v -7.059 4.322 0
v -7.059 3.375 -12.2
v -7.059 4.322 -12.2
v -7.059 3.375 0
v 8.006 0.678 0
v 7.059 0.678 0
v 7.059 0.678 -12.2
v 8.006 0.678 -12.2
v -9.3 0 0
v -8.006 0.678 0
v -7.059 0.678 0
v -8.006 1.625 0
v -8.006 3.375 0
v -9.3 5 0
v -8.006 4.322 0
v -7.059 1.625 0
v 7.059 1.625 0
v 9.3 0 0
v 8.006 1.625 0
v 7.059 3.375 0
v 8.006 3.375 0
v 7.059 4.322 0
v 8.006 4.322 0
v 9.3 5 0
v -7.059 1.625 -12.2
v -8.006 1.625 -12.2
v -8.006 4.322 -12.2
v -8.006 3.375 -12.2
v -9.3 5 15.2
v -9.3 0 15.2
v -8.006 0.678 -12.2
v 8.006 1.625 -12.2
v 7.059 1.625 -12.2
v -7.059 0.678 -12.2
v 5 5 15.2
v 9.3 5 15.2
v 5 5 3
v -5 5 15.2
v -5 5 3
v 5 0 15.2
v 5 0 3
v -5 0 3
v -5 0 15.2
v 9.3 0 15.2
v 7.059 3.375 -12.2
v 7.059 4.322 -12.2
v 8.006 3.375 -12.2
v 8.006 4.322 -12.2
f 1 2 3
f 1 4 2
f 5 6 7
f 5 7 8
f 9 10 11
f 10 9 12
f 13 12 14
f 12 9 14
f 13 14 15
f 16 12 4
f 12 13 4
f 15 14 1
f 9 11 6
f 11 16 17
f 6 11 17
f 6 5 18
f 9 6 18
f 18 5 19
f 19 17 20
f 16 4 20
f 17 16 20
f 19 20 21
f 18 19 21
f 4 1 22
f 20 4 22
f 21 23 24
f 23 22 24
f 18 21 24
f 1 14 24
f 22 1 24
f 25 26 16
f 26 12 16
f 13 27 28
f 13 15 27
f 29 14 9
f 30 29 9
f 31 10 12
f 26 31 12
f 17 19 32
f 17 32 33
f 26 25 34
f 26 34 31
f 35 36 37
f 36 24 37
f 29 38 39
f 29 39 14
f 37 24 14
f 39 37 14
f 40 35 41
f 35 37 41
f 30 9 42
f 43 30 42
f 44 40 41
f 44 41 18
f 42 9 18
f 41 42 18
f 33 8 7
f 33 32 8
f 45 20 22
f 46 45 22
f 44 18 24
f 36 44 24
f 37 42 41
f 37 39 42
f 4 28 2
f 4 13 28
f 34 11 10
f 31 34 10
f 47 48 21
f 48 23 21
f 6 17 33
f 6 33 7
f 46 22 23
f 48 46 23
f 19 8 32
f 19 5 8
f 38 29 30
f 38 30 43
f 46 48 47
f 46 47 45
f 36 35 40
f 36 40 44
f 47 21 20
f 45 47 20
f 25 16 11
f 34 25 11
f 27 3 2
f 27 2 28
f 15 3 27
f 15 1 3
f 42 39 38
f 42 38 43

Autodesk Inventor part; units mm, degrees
ref_plane "YZ Plane" through (0, 0, 0) normal (1, 0, 0) x (0, 1, 0)
ref_plane "XZ Plane" through (0, 0, 0) normal (0, 1, 0) x (-1, 0, 0)
ref_plane "XY Plane" through (0, 0, 0) normal (0, 0, 1) x (1, 0, 0)
sketch "Sketch1" plane through (0, 0, 0) normal (0, 0, 1) x (1, 0, 0)
  line L0 (-9.3, 0) -> (9.3, 0)
  line L1 (9.3, 0) -> (9.3, 5)
  line L2 (9.3, 5) -> (-9.3, 5)
  line L3 (-9.3, 5) -> (-9.3, 0)
  point P0 (0, 0)
  dimension "d2" = 18.6
  dimension "d3" = 9.3
  dimension "d4" = 5
  dimension "d7" = 0
extrude "Extrusion1" add sketch "Sketch1" along normal blind 3
sketch "Sketch2" plane through (0, 0, 3) normal (0, 0, 1) x (1, 0, 0)
  point P0 (0, 0)
sketch "Sketch3" plane through (0, 0, 3) normal (0, 0, 1) x (1, 0, 0)
  line L0 (9.3, 5) -> (-9.3, 5) projected
  line L1 (-9.3, 0) -> (9.3, 0) projected
  line L2 (-9.3, 5) -> (-5, 5)
  line L3 (-5, 5) -> (-5, 0)
  line L4 (-5, 0) -> (-9.3, 0)
  line L5 (-9.3, 0) -> (-9.3, 5)
  line L6 (0, 0) -> (0, 6.3784) construction
  line L7 (9.3, 5) -> (5, 5)
  line L8 (5, 5) -> (5, 0)
  line L9 (5, 0) -> (9.3, 0)
  line L10 (9.3, 0) -> (9.3, 5)
  point P0 (9.3, 0)
  dimension "d8" = 5
extrude "Extrusion2" add sketch "Sketch3" along normal blind 12.2 contours L10 L1 L8 L0 | L3 L1 L5 L0
sketch "Sketch4" plane through (0, 0, 0) normal (0, 0, -1) x (-1, 0, 0)
  line L0 (0, 1.1656) -> (-7.6, 1.1656) construction
  line L1 (0, 0) -> (0, 7.9667) construction
  line L2 (-8.0064, 1.6248) -> (-7.0594, 1.6248)
  line L3 (-7.0594, 1.6248) -> (-7.0594, 0.6778)
  line L4 (-7.0594, 0.6778) -> (-8.0064, 0.6778)
  line L5 (-8.0064, 0.6778) -> (-8.0064, 1.6248)
  line L6 (-9.3, 0) -> (-9.3, 5) projected
  line L7 (-9.3, 2.5) -> (9.3, 2.5) construction
  line L8 (9.3, 5) -> (9.3, 0) projected
  line L9 (-8.0064, 3.3752) -> (-7.0594, 3.3752)
  line L10 (-7.0594, 3.3752) -> (-7.0594, 4.3222)
  line L11 (-7.0594, 4.3222) -> (-8.0064, 4.3222)
  line L12 (-8.0064, 4.3222) -> (-8.0064, 3.3752)
  line L13 (8.0064, 1.6248) -> (7.0594, 1.6248)
  line L14 (7.0594, 1.6248) -> (7.0594, 0.6778)
  line L15 (7.0594, 0.6778) -> (8.0064, 0.6778)
  line L16 (8.0064, 0.6778) -> (8.0064, 1.6248)
  line L17 (8.0064, 3.3752) -> (7.0594, 3.3752)
  line L18 (7.0594, 3.3752) -> (7.0594, 4.3222)
  line L19 (7.0594, 4.3222) -> (8.0064, 4.3222)
  line L20 (8.0064, 4.3222) -> (8.0064, 3.3752)
  dimension "d11" = 7.6
extrude "Extrusion3" add sketch "Sketch4" along normal blind 12.2
properties part number "p_inter" material "PC/ABS Plastic"
